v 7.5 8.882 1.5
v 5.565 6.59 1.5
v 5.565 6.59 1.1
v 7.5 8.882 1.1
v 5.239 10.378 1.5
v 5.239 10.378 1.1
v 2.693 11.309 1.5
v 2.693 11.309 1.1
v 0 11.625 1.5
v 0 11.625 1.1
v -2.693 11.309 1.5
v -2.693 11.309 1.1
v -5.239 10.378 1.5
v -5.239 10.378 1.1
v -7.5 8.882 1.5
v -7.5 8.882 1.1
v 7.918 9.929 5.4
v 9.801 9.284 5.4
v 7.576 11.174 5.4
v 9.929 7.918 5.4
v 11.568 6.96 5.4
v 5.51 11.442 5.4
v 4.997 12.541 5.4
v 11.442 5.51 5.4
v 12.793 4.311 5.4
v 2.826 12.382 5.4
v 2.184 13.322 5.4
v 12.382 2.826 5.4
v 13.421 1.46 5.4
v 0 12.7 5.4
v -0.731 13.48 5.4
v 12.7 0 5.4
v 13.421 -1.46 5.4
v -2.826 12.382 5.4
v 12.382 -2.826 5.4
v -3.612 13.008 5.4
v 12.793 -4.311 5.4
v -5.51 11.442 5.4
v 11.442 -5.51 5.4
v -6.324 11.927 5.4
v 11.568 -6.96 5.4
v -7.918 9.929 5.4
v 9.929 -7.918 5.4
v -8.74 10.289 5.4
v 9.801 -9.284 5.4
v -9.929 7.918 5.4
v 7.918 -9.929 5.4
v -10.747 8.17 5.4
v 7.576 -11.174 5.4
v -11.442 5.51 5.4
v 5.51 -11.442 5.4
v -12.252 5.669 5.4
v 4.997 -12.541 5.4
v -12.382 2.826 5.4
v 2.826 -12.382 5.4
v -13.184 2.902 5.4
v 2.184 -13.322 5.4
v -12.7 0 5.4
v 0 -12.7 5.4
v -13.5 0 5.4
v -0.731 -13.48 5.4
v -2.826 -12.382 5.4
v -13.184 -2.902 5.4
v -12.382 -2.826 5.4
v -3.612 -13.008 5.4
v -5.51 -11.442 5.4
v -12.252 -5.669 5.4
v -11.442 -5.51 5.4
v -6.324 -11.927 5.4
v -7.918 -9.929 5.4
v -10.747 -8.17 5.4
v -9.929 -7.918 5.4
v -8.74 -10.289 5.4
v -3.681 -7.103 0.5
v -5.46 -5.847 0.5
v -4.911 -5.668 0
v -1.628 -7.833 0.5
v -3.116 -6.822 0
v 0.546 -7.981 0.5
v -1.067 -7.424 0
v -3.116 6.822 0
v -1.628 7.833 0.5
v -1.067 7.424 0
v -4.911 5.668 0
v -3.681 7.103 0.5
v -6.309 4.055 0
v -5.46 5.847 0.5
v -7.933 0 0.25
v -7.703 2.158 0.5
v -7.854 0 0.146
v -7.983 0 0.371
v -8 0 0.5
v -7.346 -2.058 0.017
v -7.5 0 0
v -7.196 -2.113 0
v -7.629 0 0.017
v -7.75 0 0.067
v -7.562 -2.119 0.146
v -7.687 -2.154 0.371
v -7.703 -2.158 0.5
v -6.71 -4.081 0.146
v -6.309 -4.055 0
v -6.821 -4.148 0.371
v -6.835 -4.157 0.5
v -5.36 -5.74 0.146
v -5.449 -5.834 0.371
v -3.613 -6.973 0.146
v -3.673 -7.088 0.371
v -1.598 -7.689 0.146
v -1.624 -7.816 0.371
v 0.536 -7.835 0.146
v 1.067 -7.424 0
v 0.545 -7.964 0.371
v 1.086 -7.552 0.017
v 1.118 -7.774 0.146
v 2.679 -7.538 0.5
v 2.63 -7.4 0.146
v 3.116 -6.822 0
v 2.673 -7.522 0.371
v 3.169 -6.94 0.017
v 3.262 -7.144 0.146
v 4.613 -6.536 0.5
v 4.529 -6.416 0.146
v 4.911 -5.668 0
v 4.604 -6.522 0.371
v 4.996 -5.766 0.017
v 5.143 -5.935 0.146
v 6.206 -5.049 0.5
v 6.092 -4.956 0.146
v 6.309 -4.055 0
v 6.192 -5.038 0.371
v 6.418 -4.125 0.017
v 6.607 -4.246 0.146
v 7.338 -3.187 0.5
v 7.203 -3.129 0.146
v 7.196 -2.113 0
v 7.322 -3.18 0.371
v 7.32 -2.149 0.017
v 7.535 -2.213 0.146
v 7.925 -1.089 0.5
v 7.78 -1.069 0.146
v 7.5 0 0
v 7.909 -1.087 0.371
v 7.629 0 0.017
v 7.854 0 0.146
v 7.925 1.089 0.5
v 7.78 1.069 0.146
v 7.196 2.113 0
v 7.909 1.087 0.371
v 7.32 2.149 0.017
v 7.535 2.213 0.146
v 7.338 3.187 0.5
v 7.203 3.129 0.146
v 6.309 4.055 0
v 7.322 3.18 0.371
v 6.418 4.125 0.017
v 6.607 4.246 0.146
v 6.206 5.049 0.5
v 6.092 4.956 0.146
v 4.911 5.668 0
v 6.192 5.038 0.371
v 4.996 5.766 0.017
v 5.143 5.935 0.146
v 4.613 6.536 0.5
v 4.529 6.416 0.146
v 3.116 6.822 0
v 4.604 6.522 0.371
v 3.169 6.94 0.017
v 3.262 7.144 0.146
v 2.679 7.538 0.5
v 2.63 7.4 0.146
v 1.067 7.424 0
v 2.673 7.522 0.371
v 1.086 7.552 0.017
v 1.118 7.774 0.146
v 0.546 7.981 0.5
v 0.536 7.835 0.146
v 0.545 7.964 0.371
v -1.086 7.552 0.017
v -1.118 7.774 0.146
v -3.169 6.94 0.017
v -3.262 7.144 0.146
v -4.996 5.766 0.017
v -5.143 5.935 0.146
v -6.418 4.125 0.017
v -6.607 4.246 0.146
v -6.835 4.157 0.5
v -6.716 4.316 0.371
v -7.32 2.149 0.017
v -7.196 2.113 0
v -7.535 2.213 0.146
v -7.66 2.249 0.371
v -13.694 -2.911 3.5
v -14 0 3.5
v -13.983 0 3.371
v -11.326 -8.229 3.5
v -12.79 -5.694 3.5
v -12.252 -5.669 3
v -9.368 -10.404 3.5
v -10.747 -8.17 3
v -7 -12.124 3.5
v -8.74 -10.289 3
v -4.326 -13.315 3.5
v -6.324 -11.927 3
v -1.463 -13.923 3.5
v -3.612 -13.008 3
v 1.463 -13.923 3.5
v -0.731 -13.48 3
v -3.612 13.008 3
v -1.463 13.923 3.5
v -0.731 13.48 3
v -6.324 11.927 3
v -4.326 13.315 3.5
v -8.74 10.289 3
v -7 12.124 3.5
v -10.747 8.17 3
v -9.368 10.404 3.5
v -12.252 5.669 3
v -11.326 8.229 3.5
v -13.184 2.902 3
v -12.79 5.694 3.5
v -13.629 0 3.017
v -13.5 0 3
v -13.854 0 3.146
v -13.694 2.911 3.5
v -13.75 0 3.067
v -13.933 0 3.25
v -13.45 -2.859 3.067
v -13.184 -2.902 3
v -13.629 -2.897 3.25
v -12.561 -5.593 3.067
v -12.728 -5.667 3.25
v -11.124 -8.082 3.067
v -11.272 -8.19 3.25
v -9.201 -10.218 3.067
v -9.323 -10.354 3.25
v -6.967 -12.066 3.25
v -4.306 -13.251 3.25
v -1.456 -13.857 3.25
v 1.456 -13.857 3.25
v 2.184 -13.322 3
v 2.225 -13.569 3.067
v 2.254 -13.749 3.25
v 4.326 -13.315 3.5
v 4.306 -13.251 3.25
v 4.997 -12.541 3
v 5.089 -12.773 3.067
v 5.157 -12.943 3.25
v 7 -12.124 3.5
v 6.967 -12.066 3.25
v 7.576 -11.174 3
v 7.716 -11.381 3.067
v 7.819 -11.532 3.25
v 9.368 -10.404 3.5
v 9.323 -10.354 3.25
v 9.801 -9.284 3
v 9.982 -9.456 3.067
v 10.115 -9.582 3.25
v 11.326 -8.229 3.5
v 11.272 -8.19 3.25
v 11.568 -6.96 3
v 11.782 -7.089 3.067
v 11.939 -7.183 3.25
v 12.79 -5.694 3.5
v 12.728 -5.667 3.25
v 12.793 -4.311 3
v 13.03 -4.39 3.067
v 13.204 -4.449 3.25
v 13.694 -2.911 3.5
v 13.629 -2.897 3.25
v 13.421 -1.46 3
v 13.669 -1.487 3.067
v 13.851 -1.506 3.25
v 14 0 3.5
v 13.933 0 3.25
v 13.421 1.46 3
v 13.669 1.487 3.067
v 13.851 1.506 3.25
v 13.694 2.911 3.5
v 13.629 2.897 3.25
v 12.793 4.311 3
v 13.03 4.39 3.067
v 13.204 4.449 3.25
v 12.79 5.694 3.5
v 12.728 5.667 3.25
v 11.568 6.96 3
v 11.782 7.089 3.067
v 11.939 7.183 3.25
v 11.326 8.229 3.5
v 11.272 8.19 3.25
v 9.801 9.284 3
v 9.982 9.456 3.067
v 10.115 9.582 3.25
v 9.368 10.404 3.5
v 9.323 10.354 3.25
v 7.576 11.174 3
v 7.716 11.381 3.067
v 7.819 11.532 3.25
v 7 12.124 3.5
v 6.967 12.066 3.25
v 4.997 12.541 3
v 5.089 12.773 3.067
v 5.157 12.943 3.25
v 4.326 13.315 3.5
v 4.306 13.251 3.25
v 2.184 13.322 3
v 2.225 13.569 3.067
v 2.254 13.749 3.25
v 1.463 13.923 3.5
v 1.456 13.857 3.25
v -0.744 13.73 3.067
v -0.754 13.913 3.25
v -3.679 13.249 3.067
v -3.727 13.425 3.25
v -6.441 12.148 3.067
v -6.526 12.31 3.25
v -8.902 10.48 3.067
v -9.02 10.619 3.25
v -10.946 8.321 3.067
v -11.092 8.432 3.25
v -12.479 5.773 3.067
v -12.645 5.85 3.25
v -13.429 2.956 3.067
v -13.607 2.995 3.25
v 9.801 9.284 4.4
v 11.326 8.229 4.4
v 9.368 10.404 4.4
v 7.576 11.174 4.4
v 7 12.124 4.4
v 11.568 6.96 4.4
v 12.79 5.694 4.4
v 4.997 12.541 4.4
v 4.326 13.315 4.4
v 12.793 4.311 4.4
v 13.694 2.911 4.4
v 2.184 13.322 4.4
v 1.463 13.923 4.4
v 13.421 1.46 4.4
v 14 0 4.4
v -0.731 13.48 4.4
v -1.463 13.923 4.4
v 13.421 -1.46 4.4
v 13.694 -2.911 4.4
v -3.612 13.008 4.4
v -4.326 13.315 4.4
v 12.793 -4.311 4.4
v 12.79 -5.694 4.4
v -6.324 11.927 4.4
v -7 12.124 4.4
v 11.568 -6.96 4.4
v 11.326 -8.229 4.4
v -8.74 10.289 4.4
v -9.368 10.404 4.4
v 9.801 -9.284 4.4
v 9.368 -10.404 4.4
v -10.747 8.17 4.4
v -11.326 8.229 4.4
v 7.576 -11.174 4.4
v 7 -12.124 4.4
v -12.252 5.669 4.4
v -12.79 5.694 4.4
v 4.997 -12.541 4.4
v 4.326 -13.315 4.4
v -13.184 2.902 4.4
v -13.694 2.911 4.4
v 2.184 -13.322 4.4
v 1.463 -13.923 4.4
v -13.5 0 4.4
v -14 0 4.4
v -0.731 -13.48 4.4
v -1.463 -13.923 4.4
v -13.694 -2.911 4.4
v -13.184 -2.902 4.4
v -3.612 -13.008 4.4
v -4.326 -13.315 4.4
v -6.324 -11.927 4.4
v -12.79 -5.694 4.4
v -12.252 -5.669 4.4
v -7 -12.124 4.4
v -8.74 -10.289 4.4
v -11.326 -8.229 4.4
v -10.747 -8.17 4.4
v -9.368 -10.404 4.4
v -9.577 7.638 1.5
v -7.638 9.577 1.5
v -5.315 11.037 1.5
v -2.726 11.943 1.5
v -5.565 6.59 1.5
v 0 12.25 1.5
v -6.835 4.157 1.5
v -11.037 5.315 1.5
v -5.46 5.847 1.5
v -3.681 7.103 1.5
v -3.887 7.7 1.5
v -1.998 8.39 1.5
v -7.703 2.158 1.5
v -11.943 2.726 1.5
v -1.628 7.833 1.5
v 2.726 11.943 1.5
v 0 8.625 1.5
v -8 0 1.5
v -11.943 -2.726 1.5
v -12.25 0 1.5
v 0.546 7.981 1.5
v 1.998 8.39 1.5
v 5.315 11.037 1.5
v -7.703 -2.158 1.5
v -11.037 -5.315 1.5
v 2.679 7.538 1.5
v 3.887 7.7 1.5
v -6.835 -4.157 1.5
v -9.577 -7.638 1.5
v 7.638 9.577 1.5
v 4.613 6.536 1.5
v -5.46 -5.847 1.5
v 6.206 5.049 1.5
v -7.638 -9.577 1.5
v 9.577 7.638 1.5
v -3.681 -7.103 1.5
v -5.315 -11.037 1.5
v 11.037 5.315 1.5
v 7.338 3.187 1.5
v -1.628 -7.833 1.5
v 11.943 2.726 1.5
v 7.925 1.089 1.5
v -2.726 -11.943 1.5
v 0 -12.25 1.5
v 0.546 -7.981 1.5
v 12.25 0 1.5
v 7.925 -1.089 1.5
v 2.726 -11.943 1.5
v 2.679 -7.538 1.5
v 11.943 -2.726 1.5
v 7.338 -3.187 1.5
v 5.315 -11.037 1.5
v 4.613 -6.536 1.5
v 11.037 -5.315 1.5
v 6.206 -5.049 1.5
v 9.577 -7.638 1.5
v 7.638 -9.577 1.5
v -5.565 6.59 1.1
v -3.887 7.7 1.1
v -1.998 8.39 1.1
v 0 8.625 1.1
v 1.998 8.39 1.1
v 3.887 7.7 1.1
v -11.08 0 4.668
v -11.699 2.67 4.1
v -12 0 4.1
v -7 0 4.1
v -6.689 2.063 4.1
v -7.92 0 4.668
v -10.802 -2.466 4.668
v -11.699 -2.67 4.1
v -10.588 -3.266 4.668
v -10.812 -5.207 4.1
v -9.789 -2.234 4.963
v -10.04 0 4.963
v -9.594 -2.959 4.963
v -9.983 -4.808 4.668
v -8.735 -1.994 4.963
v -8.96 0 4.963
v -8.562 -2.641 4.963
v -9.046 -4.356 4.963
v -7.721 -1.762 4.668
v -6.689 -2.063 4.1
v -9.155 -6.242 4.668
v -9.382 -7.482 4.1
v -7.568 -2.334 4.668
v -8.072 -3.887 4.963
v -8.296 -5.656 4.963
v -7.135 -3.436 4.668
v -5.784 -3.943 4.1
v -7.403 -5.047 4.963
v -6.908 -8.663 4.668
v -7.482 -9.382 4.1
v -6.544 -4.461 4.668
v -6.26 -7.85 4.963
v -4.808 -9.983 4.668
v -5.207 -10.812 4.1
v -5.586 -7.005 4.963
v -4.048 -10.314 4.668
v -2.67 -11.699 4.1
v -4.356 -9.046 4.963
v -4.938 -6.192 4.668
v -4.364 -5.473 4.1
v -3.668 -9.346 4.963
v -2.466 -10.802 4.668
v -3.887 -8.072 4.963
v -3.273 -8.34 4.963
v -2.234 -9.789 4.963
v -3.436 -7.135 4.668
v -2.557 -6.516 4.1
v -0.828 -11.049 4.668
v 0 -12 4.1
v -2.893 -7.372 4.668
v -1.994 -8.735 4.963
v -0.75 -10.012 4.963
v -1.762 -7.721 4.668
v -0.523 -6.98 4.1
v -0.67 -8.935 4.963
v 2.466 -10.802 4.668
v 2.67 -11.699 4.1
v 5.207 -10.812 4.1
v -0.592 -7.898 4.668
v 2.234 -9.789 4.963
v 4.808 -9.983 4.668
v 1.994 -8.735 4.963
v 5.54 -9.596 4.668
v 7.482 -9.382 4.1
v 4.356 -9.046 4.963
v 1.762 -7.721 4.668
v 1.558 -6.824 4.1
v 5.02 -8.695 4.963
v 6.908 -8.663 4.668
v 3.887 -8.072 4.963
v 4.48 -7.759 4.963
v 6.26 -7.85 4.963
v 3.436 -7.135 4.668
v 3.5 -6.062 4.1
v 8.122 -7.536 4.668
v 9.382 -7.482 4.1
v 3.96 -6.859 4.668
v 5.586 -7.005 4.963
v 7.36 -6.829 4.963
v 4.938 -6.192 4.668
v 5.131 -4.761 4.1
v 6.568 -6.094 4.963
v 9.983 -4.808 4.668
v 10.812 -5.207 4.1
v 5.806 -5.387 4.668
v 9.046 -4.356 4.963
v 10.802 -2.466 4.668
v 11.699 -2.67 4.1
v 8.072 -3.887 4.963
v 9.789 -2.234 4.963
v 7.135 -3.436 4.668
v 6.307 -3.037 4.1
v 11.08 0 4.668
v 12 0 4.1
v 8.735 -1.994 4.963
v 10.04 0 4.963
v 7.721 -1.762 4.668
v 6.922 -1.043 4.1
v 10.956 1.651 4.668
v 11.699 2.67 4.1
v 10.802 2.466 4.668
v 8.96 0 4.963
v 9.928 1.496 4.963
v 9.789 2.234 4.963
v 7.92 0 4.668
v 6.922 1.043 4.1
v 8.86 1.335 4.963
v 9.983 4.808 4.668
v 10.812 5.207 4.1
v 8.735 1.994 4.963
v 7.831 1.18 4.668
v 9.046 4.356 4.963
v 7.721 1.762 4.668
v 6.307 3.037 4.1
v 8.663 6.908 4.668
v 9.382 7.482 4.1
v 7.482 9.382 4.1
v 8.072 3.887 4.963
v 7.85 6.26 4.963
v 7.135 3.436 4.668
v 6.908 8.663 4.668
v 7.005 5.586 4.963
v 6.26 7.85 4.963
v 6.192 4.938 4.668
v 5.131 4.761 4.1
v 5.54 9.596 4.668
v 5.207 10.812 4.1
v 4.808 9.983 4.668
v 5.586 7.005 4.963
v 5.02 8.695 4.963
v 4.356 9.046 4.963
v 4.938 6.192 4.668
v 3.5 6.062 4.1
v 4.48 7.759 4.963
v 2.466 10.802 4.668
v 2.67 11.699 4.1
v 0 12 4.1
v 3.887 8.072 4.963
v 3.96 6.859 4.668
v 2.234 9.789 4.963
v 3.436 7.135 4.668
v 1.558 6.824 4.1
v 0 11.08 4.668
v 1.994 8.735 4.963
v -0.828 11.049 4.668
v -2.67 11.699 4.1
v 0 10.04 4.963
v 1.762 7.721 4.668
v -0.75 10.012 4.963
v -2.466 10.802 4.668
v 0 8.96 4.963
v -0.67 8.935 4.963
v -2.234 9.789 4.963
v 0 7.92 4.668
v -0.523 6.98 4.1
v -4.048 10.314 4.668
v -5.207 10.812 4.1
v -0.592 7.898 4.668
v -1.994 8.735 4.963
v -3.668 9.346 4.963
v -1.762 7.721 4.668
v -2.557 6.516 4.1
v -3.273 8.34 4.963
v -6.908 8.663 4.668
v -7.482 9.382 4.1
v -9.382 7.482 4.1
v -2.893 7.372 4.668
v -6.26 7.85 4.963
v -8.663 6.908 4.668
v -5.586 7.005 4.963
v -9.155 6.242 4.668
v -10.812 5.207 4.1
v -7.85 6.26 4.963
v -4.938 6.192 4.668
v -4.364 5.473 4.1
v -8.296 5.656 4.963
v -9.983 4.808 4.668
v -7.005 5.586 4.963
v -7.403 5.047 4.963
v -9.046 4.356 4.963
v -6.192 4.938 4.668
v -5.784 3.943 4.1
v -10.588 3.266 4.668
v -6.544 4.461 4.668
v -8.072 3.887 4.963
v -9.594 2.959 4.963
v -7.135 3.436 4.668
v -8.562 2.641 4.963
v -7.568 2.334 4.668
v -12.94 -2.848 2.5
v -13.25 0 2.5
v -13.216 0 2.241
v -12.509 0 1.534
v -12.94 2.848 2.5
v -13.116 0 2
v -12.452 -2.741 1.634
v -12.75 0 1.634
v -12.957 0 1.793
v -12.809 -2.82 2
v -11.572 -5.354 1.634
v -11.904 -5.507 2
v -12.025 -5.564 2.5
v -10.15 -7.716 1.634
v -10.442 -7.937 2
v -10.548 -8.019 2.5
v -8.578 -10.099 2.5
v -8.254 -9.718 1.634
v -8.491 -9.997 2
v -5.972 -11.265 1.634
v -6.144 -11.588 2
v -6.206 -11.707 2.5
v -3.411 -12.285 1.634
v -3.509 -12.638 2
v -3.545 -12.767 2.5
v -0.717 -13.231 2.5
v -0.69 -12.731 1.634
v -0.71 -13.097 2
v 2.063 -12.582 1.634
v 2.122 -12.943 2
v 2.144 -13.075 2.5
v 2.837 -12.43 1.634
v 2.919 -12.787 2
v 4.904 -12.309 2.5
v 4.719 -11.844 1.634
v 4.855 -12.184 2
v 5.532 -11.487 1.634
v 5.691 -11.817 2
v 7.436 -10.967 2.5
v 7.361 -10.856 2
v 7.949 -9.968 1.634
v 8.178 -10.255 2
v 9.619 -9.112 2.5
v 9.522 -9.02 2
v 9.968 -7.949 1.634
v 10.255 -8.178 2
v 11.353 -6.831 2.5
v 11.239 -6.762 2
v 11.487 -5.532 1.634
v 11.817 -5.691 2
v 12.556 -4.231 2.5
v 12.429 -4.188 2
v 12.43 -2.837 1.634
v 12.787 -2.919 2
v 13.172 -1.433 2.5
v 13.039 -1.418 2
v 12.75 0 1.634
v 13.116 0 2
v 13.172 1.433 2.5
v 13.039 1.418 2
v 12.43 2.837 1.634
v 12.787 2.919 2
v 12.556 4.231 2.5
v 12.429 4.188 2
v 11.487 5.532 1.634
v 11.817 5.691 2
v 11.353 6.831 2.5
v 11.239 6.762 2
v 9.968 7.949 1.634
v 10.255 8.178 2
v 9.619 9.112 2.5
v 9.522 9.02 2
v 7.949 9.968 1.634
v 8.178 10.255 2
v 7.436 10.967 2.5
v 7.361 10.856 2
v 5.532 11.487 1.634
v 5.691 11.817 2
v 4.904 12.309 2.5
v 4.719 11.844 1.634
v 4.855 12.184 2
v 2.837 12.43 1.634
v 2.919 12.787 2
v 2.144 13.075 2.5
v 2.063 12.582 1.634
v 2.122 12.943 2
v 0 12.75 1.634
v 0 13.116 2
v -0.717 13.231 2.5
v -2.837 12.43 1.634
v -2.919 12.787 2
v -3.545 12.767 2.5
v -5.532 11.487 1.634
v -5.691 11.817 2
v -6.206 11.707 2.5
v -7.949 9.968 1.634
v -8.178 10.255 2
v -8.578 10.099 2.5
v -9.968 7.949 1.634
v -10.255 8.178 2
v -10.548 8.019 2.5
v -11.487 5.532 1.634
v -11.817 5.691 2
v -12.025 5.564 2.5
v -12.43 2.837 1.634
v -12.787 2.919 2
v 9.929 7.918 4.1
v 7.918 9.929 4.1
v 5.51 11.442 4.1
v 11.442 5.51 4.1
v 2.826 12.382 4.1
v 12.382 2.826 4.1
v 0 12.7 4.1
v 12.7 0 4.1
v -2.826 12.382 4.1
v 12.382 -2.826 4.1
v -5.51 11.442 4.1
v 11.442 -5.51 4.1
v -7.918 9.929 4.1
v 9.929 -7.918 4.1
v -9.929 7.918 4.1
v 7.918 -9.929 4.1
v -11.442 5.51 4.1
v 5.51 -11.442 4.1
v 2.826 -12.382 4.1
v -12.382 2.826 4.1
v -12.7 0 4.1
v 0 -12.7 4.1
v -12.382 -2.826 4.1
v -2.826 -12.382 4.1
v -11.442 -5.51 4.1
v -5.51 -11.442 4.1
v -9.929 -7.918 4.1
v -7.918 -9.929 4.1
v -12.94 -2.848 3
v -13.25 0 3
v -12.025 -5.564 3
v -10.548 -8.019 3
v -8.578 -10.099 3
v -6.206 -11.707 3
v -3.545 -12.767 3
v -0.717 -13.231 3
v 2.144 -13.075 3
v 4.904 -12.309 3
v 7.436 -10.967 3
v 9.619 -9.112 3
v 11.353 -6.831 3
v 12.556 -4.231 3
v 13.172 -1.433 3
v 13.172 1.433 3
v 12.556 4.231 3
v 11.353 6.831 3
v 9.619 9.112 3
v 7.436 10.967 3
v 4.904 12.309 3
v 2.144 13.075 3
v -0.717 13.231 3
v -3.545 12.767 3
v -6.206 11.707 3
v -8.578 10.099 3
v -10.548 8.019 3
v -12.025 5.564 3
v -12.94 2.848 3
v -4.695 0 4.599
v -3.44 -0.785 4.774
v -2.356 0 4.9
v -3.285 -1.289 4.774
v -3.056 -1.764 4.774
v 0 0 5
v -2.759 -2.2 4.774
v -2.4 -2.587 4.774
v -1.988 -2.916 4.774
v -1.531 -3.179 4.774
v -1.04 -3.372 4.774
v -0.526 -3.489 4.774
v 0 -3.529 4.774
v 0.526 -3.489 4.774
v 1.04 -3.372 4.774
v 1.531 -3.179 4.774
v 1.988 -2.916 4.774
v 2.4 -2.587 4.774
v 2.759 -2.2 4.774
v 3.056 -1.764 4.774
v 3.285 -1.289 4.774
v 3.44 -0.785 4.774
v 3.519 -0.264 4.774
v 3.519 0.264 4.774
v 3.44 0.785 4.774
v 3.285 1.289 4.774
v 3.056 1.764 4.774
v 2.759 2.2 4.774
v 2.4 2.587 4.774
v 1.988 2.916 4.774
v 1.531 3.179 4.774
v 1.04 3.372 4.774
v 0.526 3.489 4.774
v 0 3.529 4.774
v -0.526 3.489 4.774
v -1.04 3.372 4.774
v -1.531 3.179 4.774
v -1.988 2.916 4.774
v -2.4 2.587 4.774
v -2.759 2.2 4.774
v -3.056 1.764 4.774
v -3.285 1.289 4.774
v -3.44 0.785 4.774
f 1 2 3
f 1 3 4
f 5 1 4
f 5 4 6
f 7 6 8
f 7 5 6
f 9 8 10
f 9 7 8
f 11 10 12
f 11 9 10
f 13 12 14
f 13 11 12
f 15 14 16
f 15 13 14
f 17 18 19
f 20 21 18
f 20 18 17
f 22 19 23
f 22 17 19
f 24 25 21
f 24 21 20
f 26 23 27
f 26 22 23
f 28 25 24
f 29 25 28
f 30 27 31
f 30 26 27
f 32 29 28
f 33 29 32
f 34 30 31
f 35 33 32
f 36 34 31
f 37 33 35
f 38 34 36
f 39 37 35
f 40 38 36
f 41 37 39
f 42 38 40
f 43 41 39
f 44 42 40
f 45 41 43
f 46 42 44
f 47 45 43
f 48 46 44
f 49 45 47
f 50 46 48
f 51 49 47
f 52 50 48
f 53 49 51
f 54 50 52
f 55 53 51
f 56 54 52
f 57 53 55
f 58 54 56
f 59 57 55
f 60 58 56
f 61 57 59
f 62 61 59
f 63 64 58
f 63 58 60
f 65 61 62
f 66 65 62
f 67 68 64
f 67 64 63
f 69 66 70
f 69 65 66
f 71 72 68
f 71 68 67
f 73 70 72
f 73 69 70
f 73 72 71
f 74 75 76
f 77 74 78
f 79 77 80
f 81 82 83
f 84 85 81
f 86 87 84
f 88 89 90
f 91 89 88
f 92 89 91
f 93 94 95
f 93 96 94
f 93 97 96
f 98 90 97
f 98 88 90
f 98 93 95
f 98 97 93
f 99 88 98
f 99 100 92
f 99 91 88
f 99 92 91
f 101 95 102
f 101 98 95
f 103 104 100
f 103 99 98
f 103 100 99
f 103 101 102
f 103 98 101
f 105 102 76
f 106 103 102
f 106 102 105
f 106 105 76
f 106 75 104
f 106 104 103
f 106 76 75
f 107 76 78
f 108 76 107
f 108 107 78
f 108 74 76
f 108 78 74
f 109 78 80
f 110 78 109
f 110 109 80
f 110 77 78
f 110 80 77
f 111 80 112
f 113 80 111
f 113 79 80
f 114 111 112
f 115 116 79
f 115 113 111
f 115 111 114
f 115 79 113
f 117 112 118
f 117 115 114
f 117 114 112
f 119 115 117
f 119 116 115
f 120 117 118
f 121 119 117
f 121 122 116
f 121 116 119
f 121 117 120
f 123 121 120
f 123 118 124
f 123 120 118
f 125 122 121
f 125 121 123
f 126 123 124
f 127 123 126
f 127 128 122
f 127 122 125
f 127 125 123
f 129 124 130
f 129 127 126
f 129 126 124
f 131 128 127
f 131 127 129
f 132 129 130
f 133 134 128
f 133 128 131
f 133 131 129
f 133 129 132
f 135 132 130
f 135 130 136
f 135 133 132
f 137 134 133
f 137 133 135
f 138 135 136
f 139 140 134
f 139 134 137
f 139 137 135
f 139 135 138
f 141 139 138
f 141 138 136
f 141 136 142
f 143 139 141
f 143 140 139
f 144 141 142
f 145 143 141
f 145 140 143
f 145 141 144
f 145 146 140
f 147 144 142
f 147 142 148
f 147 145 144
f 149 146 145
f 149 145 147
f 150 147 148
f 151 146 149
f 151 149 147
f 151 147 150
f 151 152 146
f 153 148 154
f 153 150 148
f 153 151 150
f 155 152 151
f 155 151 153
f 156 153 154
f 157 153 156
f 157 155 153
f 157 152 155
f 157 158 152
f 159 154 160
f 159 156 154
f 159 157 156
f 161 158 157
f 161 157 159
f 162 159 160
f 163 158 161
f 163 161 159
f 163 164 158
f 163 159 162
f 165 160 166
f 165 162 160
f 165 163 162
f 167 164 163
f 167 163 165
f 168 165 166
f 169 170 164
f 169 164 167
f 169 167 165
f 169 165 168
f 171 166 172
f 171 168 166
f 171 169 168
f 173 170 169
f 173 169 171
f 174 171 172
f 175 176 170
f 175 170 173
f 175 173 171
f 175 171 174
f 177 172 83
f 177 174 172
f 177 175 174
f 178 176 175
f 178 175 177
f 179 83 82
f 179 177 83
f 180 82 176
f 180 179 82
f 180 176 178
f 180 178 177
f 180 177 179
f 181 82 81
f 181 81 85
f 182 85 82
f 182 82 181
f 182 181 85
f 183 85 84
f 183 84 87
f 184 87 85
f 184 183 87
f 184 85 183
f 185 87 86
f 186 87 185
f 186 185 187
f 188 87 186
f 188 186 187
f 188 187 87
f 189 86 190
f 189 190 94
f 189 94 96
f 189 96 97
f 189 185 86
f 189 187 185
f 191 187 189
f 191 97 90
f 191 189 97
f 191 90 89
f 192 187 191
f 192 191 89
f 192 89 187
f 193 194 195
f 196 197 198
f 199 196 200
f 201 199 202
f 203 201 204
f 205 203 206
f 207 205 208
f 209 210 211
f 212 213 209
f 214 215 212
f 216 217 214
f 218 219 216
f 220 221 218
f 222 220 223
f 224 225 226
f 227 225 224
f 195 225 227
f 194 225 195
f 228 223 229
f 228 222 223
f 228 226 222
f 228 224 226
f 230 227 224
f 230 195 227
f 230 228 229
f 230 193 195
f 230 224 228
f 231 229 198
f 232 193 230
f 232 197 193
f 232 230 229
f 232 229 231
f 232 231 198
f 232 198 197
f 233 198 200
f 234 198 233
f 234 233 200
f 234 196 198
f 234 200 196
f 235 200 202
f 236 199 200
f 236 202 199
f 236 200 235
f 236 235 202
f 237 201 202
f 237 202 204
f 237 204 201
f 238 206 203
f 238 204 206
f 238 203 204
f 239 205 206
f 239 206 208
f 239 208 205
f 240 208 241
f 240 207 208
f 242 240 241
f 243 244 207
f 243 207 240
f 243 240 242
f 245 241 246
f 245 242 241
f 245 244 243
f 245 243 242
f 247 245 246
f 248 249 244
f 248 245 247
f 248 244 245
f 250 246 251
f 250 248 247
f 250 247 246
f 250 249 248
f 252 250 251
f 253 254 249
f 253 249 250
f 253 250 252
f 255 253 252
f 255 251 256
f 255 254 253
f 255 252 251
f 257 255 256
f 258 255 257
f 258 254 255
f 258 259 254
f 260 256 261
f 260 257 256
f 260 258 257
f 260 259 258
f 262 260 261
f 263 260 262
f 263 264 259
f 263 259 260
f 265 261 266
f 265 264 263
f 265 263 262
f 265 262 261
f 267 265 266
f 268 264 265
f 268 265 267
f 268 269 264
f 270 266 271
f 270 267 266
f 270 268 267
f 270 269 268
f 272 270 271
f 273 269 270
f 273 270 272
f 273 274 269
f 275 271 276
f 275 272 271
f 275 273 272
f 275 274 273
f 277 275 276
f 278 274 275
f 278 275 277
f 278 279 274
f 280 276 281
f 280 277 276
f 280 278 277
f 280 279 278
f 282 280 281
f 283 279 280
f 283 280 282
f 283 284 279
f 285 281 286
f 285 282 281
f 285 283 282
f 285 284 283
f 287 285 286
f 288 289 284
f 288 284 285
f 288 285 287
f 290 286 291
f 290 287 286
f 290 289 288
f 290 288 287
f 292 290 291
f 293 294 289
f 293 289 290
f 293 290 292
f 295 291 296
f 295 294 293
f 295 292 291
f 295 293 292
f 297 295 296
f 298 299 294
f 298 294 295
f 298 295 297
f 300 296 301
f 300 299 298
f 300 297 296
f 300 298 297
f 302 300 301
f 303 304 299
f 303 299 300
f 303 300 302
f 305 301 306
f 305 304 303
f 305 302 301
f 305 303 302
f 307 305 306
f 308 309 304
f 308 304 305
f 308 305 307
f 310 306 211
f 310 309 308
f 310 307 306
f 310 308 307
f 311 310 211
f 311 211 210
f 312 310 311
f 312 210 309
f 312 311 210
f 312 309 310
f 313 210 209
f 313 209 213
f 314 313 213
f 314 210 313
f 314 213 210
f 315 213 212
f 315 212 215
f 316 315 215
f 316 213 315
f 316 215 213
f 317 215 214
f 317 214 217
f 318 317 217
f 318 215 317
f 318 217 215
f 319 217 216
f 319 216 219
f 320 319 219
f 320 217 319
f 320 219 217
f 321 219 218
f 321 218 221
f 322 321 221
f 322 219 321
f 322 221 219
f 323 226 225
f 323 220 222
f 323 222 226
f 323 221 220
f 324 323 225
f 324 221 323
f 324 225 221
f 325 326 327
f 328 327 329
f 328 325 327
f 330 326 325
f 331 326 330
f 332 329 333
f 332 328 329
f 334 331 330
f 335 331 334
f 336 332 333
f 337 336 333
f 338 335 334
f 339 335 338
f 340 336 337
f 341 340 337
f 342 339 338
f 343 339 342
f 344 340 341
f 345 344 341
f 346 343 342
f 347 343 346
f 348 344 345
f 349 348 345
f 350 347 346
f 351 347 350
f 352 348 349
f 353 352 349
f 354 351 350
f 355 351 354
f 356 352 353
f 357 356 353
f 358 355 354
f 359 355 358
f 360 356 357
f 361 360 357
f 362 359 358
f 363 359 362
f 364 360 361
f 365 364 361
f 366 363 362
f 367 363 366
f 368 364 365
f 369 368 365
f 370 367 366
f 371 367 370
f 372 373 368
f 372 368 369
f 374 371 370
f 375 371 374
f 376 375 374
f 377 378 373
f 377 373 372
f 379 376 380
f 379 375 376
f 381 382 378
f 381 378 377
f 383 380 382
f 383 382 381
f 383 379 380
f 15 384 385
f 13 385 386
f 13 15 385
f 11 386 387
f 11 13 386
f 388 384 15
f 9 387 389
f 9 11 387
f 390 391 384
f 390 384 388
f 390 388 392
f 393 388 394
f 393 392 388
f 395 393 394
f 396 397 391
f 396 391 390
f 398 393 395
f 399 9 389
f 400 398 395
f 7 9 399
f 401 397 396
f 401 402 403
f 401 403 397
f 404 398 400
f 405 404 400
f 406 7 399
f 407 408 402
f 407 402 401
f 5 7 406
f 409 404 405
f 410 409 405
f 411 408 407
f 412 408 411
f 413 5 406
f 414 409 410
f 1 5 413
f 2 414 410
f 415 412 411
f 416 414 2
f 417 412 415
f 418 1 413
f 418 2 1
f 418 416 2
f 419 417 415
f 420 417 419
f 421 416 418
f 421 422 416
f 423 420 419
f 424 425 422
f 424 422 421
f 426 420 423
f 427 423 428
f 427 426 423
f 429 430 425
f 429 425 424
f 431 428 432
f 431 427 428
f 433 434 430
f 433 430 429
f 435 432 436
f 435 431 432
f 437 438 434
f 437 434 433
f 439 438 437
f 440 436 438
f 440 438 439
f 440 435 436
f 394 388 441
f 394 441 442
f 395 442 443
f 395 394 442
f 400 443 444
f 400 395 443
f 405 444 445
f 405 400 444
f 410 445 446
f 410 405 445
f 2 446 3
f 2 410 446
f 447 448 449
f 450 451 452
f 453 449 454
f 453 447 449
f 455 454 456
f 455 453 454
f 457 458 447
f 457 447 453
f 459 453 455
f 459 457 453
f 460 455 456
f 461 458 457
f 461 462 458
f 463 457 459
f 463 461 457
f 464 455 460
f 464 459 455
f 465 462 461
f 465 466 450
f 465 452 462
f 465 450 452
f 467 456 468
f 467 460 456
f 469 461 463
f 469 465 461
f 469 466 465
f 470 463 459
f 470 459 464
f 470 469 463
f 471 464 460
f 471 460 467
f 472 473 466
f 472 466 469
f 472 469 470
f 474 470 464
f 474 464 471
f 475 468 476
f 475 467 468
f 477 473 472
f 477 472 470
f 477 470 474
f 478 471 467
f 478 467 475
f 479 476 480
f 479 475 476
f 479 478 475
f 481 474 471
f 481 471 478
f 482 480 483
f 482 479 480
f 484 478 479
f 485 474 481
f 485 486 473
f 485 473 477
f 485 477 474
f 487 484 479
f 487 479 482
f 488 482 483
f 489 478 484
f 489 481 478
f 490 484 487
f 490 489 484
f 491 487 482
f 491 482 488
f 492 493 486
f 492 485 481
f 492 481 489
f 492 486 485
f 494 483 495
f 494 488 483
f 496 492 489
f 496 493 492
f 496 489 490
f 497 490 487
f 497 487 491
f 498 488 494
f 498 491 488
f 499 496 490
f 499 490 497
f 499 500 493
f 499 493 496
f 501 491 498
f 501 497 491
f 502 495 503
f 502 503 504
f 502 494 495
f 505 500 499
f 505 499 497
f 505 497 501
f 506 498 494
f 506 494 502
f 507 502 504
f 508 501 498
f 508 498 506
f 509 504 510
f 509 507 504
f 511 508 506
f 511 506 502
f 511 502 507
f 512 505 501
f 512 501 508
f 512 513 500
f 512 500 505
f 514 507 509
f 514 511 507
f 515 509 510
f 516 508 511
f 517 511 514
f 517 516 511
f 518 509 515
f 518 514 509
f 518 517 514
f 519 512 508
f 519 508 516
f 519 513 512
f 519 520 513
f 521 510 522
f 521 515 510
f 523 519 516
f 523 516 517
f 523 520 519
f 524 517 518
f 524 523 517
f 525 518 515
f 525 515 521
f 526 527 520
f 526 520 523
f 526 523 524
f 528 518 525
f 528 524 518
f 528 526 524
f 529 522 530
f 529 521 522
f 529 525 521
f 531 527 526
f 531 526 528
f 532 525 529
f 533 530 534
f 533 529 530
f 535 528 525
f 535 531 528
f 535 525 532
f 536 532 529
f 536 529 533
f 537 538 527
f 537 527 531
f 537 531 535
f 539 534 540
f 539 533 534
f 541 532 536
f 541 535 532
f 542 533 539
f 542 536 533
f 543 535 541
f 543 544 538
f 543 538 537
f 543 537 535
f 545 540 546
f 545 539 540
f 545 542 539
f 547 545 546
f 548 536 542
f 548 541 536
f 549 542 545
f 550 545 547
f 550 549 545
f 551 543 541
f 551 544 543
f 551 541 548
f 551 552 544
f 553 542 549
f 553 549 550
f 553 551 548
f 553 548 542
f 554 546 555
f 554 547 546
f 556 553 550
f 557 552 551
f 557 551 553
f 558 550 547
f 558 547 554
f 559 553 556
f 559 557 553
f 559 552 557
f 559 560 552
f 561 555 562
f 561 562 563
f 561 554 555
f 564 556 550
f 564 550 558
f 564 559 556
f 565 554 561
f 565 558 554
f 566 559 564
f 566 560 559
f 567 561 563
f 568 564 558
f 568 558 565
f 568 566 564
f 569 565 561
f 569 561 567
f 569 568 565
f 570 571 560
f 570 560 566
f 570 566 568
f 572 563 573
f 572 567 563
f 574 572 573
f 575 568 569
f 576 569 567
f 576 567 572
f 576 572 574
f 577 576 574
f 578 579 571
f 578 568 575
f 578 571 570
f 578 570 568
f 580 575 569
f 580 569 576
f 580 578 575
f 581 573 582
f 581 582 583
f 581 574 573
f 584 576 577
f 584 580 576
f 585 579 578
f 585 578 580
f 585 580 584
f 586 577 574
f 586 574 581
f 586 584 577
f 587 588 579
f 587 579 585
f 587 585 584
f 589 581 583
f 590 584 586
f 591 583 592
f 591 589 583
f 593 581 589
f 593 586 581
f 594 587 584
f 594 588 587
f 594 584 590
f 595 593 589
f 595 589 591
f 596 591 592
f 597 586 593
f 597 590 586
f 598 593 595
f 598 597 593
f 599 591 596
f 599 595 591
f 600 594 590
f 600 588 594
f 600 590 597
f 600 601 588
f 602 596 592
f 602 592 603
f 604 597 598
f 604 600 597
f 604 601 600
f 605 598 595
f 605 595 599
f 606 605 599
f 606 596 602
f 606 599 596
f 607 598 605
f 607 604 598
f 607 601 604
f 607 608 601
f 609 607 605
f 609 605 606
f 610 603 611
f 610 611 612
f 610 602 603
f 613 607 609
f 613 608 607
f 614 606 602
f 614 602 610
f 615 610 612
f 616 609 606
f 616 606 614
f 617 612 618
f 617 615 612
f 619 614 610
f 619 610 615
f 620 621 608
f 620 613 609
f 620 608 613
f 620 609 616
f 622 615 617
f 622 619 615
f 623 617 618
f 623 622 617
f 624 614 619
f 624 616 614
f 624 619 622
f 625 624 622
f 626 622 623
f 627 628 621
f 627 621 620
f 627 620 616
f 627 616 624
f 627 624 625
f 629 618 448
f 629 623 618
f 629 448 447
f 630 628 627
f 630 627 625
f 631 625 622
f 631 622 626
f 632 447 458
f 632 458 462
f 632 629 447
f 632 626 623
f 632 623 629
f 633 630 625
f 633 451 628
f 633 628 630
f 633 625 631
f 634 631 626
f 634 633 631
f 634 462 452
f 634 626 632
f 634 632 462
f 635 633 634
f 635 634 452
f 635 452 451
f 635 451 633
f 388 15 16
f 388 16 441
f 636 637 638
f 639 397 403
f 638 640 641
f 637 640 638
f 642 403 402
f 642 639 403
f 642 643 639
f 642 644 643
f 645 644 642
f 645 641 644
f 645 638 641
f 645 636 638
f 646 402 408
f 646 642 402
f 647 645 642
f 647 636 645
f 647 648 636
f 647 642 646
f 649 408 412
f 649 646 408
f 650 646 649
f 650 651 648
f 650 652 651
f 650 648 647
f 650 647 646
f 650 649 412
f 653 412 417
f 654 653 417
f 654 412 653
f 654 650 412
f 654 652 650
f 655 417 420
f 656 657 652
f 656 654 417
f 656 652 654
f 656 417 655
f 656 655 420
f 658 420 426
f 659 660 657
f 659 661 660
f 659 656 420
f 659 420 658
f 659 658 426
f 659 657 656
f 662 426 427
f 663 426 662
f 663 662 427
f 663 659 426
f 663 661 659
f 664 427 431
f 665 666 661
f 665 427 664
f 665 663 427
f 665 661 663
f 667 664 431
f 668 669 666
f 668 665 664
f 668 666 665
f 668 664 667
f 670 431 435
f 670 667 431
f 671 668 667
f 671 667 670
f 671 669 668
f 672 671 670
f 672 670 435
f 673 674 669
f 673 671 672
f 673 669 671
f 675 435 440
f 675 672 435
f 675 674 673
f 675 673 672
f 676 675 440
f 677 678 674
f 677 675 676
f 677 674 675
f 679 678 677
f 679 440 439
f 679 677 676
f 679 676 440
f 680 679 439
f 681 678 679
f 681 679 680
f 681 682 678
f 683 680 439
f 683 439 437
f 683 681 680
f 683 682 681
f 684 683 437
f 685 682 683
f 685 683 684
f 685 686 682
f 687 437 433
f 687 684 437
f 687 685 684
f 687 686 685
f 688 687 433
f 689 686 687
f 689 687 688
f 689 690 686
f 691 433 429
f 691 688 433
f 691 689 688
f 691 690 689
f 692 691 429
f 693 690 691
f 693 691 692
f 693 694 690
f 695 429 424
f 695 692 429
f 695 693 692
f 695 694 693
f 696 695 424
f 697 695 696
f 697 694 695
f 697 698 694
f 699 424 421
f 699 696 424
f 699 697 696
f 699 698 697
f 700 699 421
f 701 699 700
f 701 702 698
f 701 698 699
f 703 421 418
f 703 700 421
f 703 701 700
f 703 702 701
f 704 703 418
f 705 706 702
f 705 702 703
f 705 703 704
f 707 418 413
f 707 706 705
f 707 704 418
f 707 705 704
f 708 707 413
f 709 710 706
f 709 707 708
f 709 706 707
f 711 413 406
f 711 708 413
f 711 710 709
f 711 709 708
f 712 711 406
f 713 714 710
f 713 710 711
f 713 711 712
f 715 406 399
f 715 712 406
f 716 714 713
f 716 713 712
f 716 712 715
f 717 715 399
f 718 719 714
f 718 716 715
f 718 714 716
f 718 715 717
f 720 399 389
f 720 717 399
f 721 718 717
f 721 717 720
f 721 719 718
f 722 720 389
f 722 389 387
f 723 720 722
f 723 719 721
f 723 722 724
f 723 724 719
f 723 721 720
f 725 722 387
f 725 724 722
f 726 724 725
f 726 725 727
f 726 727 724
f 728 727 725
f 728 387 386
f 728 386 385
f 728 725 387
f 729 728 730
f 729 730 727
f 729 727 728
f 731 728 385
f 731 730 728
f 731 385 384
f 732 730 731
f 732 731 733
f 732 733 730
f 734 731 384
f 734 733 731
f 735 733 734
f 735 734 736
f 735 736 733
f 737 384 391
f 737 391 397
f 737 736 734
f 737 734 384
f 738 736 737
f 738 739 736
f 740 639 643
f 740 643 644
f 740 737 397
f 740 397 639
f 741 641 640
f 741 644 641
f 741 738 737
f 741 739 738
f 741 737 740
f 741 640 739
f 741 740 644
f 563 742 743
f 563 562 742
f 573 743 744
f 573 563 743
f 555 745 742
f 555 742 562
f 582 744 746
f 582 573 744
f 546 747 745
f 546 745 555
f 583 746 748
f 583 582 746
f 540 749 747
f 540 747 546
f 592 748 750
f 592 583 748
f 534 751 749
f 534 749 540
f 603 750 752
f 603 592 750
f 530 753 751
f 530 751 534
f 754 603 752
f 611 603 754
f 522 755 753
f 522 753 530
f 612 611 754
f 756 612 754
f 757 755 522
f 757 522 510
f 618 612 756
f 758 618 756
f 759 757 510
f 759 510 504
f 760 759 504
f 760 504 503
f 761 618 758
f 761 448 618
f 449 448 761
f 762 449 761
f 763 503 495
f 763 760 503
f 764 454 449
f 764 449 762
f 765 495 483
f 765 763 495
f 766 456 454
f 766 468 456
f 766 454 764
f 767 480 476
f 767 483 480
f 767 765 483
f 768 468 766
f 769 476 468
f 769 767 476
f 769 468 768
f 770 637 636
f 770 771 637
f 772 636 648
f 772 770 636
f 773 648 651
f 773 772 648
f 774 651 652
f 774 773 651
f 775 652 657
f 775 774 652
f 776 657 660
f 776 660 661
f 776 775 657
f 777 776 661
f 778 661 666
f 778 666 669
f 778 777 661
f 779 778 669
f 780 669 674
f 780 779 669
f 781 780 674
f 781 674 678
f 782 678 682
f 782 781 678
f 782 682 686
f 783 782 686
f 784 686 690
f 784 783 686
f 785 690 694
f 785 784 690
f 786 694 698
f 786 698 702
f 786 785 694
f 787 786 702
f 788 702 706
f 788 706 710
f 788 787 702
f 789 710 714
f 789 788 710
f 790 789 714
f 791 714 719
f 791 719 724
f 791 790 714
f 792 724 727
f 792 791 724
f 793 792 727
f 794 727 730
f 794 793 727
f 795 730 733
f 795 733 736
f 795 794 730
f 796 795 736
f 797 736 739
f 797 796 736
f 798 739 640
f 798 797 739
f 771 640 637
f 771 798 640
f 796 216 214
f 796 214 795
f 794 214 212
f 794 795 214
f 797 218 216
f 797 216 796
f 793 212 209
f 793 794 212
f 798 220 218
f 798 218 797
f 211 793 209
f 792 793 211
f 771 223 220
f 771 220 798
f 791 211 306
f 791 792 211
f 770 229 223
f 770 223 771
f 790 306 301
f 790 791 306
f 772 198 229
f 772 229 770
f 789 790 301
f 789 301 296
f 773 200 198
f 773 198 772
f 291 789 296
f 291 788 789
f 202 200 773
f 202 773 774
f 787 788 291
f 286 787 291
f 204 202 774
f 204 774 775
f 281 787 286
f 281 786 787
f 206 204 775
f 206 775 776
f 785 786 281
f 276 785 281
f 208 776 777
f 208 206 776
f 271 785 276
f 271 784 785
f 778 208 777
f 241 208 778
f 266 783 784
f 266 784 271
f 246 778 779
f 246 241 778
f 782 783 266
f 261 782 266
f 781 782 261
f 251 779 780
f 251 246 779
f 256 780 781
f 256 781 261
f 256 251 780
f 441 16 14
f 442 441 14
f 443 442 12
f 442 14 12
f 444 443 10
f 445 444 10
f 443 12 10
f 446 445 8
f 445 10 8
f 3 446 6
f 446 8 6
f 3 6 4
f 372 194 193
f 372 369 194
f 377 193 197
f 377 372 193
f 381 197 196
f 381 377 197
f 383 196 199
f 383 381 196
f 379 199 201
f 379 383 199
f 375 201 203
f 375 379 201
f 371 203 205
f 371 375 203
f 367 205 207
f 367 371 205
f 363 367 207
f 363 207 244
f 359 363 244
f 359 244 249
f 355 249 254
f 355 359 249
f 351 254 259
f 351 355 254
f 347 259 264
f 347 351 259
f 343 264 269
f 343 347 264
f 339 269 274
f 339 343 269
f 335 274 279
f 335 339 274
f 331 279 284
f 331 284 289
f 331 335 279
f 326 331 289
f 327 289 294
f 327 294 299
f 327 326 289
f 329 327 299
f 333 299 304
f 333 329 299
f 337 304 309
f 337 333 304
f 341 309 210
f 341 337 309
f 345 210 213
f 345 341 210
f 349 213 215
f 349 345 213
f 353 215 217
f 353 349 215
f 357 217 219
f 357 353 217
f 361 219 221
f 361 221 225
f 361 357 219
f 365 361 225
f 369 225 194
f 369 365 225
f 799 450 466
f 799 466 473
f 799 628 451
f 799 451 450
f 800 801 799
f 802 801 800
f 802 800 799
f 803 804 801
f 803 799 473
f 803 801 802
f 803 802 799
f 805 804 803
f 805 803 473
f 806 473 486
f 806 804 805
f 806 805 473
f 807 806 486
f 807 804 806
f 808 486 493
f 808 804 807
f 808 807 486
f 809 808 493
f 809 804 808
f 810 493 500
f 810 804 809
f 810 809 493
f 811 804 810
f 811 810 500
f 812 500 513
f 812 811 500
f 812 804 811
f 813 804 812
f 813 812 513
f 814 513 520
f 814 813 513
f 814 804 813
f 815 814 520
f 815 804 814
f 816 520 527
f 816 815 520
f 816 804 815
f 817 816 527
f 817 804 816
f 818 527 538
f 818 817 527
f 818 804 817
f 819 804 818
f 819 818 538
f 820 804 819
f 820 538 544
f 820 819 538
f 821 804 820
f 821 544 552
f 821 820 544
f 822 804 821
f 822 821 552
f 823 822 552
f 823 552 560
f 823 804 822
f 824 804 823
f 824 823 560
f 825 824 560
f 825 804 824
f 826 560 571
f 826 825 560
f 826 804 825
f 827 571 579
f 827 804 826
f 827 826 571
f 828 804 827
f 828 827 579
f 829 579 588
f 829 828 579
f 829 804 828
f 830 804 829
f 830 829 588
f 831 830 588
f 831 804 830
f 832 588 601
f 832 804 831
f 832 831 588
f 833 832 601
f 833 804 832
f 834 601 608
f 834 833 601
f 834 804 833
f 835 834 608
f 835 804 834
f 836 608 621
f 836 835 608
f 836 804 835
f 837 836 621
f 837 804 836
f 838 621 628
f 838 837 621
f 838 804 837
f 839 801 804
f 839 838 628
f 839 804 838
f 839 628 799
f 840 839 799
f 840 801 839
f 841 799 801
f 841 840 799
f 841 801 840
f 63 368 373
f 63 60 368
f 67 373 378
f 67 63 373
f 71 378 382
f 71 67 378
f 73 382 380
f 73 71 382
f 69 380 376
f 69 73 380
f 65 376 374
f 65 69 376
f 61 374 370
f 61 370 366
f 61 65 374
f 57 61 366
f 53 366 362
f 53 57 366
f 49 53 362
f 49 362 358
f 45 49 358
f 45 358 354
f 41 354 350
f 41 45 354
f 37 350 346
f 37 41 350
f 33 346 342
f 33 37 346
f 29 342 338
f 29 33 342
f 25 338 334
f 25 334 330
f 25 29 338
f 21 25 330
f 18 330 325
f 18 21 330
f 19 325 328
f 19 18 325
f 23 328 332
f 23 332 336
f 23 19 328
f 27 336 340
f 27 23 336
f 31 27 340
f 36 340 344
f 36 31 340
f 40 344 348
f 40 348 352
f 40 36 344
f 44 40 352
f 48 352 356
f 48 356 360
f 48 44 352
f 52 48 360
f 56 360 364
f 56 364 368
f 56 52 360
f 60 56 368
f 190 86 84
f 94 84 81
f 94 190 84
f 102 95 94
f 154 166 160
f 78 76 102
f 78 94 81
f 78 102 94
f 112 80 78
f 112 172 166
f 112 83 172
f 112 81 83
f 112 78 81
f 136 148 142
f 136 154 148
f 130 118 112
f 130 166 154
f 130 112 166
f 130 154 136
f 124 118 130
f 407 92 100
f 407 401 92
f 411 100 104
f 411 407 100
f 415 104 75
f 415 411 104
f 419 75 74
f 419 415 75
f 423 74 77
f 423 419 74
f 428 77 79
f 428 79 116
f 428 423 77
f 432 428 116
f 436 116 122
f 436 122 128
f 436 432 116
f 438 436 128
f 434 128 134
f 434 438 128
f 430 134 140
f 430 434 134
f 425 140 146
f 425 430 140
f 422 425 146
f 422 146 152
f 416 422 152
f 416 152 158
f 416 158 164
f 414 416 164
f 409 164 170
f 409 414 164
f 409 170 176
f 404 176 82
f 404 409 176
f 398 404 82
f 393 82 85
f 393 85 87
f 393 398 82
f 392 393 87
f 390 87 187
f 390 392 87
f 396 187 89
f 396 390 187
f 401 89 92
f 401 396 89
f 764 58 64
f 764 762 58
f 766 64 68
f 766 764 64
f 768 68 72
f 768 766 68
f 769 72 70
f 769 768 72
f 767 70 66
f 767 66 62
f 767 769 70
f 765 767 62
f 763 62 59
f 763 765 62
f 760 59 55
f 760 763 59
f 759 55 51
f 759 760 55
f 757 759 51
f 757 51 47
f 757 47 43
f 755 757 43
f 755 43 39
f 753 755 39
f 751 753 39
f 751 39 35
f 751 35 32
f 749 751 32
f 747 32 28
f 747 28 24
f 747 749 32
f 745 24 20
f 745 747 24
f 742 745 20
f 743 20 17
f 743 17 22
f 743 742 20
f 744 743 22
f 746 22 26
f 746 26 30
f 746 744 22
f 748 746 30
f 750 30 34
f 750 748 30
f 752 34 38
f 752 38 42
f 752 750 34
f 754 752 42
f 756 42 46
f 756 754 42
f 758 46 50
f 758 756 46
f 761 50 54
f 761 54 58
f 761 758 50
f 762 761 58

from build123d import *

# Parameters (mm, degrees)
EXTRUDE_2_DEPTH = 0.4


with BuildPart() as part:
    # Эскиз1 → Повернуть2 (revolve)
    with BuildSketch(Plane(origin=(0, 0, 0), x_dir=(1, 0, 0), z_dir=(0, 1, 0))):
        with BuildLine():
            Line((0, 0), (7.5, 0))
            ThreePointArc((7.5, 0), (7.853553391, -0.146446609), (8, -0.5))
            Line((8, -0.5), (8, -1.5))
            Line((8, -1.5), (12.25, -1.5))
            ThreePointArc((12.25, -1.5), (12.957106781, -1.792893219), (13.25, -2.5))
            Line((13.25, -2.5), (13.25, -3))
            Line((13.25, -3), (13.5, -3))
            ThreePointArc((13.5, -3), (13.853553391, -3.146446609), (14, -3.5))
            Line((14, -3.5), (14, -4.4))
            Line((14, -4.4), (13.5, -4.4))
            Line((13.5, -4.4), (13.5, -5.4))
            Line((13.5, -5.4), (12.7, -5.4))
            Line((12.7, -5.4), (12.7, -4.1))
            Line((12.7, -4.1), (12, -4.1))
            ThreePointArc((12, -4.1), (9.5, -5), (7, -4.1))
            ThreePointArc((7, -4.1), (3.528809998, -4.77407776), (0, -5))
            Line((0, -5), (0, 0))
        make_face()
    revolve(axis=Axis((0, 0, 0), (0, 0, 1)))

    # Эскиз2 → Бобышка-Вытянуть2 (add)
    with BuildSketch(Plane(origin=(0, 0, 1.5), x_dir=(-1, 0, 0), z_dir=(0, 0, -1))):
        with BuildLine():
            Line((-5.564516129, 6.589900246), (-7.5, 8.882039462))
            ThreePointArc((-7.5, 8.882039462), (0, 11.625), (7.5, 8.882039462))
            Line((7.5, 8.882039462), (5.564516129, 6.589900246))
            ThreePointArc((5.564516129, 6.589900246), (0, 8.625), (-5.564516129, 6.589900246))
        make_face()
    extrude(amount=EXTRUDE_2_DEPTH)


solid = part.part
